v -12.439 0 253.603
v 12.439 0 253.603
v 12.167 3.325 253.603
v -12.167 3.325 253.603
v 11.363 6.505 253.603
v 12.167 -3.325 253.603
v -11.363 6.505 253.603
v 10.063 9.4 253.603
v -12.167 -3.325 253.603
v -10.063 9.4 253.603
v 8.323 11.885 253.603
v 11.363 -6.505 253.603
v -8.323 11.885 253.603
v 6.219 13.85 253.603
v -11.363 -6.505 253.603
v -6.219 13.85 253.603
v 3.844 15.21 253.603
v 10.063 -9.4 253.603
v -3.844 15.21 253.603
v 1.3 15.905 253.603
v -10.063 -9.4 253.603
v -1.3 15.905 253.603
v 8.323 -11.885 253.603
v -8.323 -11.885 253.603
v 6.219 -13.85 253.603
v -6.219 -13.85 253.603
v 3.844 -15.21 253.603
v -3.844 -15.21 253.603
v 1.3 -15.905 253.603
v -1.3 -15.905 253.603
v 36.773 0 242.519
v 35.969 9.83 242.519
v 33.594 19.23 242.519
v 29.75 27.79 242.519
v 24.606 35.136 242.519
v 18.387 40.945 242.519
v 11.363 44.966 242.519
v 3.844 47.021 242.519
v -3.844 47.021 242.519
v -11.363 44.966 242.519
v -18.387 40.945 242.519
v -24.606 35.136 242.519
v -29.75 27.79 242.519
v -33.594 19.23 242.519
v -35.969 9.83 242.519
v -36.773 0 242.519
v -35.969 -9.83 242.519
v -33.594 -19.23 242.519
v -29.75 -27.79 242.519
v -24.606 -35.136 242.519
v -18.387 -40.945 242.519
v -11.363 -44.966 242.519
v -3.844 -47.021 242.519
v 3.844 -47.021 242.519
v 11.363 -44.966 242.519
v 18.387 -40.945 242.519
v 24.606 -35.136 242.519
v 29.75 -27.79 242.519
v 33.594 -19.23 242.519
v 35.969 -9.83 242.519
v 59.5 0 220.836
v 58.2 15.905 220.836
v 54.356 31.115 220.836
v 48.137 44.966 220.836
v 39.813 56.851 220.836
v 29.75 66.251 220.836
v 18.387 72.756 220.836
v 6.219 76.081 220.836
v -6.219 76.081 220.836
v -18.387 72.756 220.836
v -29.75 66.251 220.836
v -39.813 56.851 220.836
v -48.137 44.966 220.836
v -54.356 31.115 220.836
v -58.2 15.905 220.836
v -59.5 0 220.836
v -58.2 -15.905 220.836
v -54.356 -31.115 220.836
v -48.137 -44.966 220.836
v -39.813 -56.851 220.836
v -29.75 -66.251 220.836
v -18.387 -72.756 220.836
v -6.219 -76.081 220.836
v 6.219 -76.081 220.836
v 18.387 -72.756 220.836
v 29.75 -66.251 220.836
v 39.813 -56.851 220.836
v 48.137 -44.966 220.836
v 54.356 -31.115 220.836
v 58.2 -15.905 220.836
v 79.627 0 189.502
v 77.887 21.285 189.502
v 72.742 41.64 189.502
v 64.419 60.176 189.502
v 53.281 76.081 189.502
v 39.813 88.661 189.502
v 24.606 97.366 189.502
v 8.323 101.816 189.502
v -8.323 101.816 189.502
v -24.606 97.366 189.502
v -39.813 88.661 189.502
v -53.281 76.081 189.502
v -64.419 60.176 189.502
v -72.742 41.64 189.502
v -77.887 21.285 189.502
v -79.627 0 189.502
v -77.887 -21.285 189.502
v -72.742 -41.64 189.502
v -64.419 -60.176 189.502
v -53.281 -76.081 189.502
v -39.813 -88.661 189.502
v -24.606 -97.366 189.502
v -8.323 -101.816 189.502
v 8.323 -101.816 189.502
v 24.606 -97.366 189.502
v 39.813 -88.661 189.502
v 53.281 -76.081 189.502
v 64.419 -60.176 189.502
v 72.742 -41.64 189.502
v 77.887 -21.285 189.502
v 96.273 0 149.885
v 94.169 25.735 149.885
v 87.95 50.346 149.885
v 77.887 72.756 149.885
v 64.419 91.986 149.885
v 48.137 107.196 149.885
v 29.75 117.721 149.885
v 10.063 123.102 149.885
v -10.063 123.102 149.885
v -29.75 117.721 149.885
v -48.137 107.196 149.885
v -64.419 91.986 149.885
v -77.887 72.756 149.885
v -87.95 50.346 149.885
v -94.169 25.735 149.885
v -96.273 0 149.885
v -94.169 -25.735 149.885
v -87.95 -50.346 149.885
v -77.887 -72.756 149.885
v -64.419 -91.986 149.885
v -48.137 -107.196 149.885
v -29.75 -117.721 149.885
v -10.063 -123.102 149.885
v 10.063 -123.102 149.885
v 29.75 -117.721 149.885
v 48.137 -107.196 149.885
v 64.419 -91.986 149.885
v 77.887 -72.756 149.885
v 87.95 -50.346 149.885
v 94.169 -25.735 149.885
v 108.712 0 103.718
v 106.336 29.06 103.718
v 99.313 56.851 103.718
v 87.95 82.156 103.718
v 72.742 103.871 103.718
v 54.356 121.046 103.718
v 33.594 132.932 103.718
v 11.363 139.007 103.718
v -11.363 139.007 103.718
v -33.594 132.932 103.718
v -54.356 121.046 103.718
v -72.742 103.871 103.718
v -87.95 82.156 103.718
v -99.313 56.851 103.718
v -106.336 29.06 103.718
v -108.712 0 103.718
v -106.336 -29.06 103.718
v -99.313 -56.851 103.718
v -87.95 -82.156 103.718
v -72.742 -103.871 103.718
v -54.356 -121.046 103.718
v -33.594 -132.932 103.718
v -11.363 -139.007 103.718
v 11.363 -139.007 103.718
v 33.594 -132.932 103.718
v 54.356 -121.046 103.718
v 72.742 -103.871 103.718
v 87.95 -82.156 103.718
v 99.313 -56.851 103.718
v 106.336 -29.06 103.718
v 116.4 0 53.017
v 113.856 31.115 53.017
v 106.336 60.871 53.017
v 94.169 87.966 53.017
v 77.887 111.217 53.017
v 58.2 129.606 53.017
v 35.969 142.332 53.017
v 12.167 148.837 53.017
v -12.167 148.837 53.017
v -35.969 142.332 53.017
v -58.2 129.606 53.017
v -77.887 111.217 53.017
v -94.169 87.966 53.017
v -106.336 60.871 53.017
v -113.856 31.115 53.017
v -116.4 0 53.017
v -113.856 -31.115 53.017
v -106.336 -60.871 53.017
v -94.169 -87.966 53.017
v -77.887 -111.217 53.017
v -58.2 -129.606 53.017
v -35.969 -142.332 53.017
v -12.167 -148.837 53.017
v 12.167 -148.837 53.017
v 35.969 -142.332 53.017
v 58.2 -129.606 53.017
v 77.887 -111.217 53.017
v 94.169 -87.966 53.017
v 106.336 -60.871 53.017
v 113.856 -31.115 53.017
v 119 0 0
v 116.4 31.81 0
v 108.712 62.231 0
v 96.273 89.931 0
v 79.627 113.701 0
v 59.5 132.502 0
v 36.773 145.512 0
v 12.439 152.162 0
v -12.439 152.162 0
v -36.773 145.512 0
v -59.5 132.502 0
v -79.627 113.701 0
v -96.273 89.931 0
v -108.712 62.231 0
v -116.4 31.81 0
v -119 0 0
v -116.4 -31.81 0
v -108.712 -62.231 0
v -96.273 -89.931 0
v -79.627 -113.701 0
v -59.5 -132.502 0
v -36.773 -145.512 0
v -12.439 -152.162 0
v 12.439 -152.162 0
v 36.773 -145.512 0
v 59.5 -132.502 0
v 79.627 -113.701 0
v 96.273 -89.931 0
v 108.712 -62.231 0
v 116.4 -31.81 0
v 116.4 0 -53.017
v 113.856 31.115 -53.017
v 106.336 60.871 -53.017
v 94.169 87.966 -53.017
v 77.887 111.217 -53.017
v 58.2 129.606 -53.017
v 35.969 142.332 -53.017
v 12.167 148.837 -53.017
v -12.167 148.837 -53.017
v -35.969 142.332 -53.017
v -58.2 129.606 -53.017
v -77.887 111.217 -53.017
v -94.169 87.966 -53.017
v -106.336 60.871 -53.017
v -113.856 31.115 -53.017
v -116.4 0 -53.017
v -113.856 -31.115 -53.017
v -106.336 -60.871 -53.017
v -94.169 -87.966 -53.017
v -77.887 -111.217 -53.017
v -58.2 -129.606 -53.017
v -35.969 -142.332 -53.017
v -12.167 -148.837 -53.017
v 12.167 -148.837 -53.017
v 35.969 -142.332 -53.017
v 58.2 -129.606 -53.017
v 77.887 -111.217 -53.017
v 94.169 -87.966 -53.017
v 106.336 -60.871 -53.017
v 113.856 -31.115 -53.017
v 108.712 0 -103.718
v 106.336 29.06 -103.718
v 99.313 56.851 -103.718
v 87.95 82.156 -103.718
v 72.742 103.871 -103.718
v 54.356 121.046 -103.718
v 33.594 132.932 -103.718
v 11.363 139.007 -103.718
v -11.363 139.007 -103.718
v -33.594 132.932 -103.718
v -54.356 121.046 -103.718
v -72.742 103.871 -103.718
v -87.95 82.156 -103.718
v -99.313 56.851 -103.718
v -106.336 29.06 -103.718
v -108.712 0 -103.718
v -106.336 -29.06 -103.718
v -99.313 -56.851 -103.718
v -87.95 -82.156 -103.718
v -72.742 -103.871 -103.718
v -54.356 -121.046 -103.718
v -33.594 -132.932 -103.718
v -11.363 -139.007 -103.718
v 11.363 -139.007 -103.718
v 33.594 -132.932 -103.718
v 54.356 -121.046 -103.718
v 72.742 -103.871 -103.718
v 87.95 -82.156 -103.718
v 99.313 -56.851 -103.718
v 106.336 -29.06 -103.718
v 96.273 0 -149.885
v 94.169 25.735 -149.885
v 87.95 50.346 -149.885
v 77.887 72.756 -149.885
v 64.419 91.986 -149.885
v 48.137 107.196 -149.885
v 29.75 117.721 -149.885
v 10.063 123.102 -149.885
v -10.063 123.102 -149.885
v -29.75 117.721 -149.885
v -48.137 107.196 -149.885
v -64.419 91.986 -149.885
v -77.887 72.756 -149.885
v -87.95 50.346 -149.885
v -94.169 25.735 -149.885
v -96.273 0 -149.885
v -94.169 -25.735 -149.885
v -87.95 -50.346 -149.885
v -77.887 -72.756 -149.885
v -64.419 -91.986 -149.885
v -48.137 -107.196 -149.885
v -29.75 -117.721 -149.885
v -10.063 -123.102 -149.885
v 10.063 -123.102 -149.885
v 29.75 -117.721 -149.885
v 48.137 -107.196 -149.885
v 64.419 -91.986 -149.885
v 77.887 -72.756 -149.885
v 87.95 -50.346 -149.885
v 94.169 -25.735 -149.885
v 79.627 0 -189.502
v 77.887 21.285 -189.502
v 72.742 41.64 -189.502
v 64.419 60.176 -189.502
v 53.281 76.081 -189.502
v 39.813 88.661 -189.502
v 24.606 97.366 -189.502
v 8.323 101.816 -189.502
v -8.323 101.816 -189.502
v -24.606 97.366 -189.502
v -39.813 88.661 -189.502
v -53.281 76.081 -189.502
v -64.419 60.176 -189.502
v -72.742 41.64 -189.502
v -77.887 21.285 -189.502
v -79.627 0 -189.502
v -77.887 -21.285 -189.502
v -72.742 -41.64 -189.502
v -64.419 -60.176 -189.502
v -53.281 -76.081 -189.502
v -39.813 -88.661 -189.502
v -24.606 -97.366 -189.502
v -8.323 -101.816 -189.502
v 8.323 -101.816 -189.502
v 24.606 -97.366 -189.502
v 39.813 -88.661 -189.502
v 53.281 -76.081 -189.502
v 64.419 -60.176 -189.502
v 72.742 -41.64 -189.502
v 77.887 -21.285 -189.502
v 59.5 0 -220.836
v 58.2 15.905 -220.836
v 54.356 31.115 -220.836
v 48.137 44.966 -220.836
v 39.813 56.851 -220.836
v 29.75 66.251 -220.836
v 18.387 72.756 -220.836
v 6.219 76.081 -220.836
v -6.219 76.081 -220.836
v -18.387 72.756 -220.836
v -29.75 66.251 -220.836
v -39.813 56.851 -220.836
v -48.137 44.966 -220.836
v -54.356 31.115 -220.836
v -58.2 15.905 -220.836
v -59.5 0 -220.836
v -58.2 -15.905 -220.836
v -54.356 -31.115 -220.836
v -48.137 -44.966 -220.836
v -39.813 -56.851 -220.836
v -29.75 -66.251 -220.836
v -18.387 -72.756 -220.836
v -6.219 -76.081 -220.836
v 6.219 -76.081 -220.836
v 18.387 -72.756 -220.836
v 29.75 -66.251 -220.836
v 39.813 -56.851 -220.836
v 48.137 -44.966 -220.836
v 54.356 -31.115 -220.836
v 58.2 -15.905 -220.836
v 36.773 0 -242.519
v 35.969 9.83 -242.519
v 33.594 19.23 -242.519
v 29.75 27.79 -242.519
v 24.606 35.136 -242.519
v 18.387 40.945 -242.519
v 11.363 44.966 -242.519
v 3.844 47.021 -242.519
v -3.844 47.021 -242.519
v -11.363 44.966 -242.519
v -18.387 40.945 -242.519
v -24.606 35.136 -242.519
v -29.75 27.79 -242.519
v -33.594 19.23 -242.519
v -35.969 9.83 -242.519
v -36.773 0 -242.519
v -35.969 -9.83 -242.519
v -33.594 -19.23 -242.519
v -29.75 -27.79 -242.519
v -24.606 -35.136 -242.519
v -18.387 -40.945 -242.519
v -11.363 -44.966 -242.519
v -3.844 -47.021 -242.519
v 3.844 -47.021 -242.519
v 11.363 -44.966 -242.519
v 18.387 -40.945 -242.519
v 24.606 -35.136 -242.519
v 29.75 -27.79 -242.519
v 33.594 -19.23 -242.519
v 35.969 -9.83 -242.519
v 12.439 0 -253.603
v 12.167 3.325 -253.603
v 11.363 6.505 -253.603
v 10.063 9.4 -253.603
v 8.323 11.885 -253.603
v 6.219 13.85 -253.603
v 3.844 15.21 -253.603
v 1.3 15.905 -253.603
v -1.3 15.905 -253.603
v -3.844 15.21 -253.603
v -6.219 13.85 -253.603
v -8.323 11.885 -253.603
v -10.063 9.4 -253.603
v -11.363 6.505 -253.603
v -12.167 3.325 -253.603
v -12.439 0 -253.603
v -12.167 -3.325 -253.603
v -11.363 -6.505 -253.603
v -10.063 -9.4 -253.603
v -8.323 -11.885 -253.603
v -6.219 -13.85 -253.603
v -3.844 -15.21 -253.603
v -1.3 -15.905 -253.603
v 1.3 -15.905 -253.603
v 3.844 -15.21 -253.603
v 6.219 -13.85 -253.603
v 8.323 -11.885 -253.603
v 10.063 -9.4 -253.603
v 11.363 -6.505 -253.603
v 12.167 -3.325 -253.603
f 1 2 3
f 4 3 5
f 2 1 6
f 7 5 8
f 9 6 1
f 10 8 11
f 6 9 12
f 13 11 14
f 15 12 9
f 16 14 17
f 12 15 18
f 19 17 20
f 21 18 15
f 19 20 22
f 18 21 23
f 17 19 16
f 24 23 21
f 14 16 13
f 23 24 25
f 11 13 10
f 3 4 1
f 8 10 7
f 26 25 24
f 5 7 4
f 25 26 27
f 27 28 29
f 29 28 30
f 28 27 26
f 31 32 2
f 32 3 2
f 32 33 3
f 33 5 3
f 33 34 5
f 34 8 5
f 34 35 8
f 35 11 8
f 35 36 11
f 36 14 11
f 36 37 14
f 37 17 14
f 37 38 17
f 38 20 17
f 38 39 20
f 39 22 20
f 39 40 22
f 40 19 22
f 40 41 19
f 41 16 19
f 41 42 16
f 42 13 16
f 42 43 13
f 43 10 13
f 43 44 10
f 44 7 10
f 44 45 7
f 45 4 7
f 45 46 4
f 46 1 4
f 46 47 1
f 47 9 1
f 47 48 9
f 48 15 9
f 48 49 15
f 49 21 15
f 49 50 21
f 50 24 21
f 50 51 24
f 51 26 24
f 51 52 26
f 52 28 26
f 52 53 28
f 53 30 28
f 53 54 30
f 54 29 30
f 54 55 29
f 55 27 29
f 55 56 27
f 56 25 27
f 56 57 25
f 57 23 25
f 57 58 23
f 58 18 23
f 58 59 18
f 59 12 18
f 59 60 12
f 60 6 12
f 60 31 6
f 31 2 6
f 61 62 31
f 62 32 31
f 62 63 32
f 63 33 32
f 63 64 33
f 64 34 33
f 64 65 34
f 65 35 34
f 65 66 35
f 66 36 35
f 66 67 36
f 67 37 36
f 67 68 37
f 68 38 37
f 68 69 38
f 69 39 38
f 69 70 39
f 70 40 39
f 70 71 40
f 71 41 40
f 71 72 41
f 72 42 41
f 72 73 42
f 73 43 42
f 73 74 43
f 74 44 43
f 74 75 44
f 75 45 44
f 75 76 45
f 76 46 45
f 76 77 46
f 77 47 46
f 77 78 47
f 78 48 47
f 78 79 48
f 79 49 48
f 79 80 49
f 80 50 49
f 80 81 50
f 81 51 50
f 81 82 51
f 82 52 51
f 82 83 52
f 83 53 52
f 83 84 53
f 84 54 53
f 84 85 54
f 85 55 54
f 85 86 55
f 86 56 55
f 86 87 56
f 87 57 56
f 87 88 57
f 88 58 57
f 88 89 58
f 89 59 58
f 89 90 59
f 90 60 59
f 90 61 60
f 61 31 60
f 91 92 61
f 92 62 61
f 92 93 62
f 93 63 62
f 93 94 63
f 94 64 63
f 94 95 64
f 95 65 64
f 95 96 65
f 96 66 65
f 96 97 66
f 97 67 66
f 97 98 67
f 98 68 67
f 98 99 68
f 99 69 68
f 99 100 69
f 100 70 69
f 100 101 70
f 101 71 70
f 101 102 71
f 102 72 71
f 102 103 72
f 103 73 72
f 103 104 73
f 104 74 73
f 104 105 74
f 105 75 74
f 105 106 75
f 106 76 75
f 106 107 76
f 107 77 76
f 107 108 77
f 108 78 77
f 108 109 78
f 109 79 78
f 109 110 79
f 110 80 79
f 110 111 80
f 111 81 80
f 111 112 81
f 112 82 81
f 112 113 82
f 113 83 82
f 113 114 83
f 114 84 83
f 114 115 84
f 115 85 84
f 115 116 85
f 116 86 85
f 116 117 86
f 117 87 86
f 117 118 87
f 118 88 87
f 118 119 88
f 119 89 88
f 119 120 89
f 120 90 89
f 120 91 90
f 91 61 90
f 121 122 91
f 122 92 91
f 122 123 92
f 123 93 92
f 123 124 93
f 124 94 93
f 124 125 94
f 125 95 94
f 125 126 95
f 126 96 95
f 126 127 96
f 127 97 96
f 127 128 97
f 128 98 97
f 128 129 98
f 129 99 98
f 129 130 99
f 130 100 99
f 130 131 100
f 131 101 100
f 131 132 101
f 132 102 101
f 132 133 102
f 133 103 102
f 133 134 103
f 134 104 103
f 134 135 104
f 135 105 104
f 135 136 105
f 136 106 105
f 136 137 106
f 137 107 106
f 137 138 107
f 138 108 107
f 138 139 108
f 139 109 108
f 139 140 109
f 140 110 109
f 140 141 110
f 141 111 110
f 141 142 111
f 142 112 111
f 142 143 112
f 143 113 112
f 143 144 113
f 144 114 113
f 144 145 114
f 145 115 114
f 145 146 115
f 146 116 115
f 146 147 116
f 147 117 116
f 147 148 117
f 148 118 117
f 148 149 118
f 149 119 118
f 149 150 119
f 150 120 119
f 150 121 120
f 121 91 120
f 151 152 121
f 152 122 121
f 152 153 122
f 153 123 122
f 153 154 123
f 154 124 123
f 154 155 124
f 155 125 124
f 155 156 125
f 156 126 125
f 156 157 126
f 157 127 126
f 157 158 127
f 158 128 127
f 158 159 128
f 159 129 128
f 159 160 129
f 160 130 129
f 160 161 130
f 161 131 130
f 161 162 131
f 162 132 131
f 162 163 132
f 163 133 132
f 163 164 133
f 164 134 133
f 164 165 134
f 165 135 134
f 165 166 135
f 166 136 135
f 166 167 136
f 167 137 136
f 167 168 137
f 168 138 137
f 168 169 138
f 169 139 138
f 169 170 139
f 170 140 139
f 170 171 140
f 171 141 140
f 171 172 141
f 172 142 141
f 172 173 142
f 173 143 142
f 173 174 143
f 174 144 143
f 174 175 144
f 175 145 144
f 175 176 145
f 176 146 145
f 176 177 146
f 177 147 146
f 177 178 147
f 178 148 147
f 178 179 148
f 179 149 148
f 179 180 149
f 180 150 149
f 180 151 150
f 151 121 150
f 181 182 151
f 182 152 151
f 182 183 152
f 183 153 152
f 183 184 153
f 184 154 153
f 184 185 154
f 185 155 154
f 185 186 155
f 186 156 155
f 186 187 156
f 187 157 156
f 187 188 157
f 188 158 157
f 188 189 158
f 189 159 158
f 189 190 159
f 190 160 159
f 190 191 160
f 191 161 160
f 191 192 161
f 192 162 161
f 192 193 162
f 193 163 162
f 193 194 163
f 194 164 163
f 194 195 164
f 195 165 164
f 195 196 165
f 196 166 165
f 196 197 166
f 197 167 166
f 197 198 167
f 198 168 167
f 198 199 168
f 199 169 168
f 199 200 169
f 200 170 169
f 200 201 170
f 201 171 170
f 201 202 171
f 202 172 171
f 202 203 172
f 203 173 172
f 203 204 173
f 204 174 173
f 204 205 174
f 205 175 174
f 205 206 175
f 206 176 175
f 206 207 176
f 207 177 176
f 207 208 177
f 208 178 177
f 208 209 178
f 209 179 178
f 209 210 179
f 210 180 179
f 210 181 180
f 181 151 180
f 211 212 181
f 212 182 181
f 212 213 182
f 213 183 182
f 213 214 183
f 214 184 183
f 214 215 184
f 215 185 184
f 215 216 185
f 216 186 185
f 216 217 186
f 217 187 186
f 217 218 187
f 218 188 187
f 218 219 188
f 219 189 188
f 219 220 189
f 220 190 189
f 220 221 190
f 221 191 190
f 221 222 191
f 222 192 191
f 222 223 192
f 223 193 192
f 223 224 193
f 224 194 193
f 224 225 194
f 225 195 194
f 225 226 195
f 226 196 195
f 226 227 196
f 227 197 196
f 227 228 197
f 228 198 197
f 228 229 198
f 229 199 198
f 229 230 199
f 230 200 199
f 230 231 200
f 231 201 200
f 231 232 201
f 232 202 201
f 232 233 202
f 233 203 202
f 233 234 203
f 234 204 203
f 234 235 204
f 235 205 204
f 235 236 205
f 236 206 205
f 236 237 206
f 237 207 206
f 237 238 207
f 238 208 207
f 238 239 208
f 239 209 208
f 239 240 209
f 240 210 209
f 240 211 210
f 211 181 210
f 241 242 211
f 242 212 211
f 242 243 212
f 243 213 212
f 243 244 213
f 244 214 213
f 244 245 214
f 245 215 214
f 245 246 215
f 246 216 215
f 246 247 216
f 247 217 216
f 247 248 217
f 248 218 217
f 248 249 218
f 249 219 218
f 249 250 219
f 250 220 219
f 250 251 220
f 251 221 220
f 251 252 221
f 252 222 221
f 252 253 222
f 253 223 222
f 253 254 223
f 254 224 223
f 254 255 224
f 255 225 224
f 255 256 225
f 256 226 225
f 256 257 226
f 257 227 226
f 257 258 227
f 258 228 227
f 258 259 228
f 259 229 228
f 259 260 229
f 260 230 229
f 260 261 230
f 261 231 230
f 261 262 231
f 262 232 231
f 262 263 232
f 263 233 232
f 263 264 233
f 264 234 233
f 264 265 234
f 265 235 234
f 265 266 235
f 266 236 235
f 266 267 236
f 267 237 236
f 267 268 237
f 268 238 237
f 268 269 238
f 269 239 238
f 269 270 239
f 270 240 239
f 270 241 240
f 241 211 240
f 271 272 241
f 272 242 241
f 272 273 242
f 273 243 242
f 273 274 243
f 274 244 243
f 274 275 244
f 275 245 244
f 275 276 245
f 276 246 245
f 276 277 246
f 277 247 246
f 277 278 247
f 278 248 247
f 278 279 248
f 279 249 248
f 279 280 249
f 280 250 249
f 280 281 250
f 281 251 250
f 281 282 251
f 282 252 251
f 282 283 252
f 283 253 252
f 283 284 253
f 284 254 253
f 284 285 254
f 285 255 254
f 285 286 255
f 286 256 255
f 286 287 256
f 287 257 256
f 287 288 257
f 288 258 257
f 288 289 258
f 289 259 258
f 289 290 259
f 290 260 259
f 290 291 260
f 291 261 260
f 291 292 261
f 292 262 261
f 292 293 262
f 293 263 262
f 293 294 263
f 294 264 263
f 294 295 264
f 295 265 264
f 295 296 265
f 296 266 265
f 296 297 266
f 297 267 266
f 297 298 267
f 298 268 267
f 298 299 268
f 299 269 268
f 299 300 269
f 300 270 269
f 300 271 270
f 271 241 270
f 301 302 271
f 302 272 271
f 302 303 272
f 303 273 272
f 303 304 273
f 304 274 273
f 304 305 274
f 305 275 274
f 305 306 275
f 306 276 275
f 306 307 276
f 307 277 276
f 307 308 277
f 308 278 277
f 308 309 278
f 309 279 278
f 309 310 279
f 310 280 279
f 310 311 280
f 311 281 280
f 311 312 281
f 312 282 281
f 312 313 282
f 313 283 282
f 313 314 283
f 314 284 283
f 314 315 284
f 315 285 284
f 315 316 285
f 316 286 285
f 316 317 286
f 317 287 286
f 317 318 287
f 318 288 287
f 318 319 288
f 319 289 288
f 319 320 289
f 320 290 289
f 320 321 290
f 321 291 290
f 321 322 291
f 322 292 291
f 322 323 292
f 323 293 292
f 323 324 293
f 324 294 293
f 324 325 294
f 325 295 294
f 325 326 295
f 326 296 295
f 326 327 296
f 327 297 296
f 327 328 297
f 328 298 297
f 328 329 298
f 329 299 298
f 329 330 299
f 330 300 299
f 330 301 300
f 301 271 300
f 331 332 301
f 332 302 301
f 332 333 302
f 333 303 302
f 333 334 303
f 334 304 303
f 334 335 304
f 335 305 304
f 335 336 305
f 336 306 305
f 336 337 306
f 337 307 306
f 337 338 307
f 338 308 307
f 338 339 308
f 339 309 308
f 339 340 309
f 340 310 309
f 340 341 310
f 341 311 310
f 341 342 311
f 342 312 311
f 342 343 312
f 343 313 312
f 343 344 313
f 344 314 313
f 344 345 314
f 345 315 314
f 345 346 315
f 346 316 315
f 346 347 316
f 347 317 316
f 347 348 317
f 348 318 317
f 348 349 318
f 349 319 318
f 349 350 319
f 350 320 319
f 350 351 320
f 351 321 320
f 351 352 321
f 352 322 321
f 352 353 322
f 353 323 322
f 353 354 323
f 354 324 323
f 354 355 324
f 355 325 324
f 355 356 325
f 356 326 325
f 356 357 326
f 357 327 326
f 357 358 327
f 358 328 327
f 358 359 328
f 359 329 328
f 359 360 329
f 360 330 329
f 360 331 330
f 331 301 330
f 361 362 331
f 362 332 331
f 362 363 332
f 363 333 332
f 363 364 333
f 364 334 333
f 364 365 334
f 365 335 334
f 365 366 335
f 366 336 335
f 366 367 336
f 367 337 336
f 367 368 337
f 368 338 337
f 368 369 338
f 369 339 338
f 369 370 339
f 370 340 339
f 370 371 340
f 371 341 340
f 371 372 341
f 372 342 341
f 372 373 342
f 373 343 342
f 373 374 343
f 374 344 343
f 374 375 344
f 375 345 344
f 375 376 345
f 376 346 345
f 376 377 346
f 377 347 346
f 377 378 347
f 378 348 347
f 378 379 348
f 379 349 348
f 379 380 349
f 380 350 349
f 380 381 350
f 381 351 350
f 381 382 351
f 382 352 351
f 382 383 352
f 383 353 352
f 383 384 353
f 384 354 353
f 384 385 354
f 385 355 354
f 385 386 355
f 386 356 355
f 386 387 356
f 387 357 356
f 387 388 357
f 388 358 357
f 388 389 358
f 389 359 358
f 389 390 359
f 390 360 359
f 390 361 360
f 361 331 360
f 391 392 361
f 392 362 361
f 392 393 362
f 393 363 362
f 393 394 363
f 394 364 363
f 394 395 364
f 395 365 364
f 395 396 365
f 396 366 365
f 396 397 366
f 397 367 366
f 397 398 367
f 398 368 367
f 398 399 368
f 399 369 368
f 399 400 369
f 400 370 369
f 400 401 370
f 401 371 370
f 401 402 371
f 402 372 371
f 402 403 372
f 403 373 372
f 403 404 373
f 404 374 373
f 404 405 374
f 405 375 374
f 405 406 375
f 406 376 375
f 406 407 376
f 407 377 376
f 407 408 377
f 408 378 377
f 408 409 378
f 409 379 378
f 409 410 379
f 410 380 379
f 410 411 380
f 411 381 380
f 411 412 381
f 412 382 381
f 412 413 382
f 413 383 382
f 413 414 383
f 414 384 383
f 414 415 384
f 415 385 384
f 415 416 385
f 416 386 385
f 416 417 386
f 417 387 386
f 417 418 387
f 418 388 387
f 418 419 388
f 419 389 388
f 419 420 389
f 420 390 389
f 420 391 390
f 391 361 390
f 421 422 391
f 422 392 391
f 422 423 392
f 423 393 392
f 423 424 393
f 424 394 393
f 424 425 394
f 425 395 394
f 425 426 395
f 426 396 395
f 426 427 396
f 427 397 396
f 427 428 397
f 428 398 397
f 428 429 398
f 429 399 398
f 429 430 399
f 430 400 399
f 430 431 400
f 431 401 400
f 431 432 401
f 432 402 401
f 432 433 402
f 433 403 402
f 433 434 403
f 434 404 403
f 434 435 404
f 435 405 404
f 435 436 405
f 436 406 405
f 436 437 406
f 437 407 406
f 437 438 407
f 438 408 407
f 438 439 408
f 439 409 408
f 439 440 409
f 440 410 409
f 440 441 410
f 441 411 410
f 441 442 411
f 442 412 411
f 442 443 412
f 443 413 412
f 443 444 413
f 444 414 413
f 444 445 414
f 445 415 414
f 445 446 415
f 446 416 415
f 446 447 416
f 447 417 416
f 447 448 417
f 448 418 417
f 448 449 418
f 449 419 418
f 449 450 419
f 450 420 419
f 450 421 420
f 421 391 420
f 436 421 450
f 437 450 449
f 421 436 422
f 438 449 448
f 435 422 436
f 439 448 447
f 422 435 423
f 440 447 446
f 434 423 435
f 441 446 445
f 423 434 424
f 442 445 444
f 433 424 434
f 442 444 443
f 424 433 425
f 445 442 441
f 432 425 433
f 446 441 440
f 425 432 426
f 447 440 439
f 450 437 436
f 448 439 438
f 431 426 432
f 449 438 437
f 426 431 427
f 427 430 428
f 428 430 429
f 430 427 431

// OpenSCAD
// Generated by SolidPython 1.0.1 on 2020-07-29 00:39:26


scale(v = [7, 9, 15]) {
	sphere(r = 17);
}
/***********************************************
*********      SolidPython code:      **********
************************************************
 
# import packages: SolidPython
from solid import *
from solid.utils import *
from itertools import chain, combinations


class Resize:

    def __init__(self, scad_file):
        self.scad_file = scad_file
        #self.scad_file = import_scad(scad_file)
        # cone/cylinder param:
        self.r1 = 0
        self.r2 = 0
        self.h = 0
        # rectangular prism param:
        self.w = 0
        self.l = 0
        # ellipse param:
        self.r = 0

    # import OpenScad code (file name corresponds to shape)


    # classify shape + parameters
    def assign(self, param1, param2, param3):
        if self.scad_file == 'cone.scad':
            self.r1 = param1
            self.r2 = param2
            self.h = param3
        elif self.scad_file == 'cylinder.scad':
            self.r1 = param1
            self.r2 = param2
            self.h = param3
        elif self.scad_file == 'rectangularPrism.scad':
            self.h = param1
            self.l = param2
            self.w = param3
        else:
            self.r = param1
            self.h = param2

    # resize parameters
    def iterate(self):
        x = range(3, 20, 2)
        i = 1
        if self.scad_file == 'cone.scad':
            tempList = list(combinations(x, 2))
            for temp in tempList:
                param1 = temp[0]
                param2 = temp[1]
                filepath = 'produced_scad_files/' + 'cone' + str(param1) + '_' + str(param2) + '_' + '.scad'
                scad_render_to_file(cylinder(h=param1, r1=param2, r2=0), filepath)

        elif self.scad_file == 'cylinder.scad':
            tempList = list(combinations(x, 3))
            for temp in tempList:
                param1 = temp[0]
                param2 = temp[1]
                filepath = 'produced_scad_files/' + 'cylinder' + str(param1) + '_' + str(param2) + '_' + '.scad'
                scad_render_to_file(cylinder(h=param1, r1=param2, r2=param2), filepath)

        elif self.scad_file == 'rectangularPrism.scad':
            tempList = list(combinations(x, 3))
            for temp in tempList:
                param1 = temp[0]
                param2 = temp[1]
                param3 = temp[2]
                filepath = 'produced_scad_files/' + 'rectangularPrism' + str(param1) + '_' + str(param2) + '_' + str(
                    param3) + '.scad'
                scad_render_to_file(cube(size=(param1, param2, param3)), filepath)

        elif self.scad_file == 'ellipse.scad':
            tempList = list(combinations(x, 4))
            for temp in tempList:
                param1 = temp[0]
                param2 = temp[1]
                param3 = temp[2]
                param4 = temp[3]
                filepath = 'produced_scad_files/' + 'ellipse' + str(param1) + '_' + str(param2) + '_' + str(param3) + '_' + str(param4) + '.scad'
                scad_render_to_file(scale([param1, param2, param3])(sphere(r=param4)), filepath)

    def render_to_scadfile(self):
        scad_render_to_file(scad, 'example.scad') 
 
************************************************/
